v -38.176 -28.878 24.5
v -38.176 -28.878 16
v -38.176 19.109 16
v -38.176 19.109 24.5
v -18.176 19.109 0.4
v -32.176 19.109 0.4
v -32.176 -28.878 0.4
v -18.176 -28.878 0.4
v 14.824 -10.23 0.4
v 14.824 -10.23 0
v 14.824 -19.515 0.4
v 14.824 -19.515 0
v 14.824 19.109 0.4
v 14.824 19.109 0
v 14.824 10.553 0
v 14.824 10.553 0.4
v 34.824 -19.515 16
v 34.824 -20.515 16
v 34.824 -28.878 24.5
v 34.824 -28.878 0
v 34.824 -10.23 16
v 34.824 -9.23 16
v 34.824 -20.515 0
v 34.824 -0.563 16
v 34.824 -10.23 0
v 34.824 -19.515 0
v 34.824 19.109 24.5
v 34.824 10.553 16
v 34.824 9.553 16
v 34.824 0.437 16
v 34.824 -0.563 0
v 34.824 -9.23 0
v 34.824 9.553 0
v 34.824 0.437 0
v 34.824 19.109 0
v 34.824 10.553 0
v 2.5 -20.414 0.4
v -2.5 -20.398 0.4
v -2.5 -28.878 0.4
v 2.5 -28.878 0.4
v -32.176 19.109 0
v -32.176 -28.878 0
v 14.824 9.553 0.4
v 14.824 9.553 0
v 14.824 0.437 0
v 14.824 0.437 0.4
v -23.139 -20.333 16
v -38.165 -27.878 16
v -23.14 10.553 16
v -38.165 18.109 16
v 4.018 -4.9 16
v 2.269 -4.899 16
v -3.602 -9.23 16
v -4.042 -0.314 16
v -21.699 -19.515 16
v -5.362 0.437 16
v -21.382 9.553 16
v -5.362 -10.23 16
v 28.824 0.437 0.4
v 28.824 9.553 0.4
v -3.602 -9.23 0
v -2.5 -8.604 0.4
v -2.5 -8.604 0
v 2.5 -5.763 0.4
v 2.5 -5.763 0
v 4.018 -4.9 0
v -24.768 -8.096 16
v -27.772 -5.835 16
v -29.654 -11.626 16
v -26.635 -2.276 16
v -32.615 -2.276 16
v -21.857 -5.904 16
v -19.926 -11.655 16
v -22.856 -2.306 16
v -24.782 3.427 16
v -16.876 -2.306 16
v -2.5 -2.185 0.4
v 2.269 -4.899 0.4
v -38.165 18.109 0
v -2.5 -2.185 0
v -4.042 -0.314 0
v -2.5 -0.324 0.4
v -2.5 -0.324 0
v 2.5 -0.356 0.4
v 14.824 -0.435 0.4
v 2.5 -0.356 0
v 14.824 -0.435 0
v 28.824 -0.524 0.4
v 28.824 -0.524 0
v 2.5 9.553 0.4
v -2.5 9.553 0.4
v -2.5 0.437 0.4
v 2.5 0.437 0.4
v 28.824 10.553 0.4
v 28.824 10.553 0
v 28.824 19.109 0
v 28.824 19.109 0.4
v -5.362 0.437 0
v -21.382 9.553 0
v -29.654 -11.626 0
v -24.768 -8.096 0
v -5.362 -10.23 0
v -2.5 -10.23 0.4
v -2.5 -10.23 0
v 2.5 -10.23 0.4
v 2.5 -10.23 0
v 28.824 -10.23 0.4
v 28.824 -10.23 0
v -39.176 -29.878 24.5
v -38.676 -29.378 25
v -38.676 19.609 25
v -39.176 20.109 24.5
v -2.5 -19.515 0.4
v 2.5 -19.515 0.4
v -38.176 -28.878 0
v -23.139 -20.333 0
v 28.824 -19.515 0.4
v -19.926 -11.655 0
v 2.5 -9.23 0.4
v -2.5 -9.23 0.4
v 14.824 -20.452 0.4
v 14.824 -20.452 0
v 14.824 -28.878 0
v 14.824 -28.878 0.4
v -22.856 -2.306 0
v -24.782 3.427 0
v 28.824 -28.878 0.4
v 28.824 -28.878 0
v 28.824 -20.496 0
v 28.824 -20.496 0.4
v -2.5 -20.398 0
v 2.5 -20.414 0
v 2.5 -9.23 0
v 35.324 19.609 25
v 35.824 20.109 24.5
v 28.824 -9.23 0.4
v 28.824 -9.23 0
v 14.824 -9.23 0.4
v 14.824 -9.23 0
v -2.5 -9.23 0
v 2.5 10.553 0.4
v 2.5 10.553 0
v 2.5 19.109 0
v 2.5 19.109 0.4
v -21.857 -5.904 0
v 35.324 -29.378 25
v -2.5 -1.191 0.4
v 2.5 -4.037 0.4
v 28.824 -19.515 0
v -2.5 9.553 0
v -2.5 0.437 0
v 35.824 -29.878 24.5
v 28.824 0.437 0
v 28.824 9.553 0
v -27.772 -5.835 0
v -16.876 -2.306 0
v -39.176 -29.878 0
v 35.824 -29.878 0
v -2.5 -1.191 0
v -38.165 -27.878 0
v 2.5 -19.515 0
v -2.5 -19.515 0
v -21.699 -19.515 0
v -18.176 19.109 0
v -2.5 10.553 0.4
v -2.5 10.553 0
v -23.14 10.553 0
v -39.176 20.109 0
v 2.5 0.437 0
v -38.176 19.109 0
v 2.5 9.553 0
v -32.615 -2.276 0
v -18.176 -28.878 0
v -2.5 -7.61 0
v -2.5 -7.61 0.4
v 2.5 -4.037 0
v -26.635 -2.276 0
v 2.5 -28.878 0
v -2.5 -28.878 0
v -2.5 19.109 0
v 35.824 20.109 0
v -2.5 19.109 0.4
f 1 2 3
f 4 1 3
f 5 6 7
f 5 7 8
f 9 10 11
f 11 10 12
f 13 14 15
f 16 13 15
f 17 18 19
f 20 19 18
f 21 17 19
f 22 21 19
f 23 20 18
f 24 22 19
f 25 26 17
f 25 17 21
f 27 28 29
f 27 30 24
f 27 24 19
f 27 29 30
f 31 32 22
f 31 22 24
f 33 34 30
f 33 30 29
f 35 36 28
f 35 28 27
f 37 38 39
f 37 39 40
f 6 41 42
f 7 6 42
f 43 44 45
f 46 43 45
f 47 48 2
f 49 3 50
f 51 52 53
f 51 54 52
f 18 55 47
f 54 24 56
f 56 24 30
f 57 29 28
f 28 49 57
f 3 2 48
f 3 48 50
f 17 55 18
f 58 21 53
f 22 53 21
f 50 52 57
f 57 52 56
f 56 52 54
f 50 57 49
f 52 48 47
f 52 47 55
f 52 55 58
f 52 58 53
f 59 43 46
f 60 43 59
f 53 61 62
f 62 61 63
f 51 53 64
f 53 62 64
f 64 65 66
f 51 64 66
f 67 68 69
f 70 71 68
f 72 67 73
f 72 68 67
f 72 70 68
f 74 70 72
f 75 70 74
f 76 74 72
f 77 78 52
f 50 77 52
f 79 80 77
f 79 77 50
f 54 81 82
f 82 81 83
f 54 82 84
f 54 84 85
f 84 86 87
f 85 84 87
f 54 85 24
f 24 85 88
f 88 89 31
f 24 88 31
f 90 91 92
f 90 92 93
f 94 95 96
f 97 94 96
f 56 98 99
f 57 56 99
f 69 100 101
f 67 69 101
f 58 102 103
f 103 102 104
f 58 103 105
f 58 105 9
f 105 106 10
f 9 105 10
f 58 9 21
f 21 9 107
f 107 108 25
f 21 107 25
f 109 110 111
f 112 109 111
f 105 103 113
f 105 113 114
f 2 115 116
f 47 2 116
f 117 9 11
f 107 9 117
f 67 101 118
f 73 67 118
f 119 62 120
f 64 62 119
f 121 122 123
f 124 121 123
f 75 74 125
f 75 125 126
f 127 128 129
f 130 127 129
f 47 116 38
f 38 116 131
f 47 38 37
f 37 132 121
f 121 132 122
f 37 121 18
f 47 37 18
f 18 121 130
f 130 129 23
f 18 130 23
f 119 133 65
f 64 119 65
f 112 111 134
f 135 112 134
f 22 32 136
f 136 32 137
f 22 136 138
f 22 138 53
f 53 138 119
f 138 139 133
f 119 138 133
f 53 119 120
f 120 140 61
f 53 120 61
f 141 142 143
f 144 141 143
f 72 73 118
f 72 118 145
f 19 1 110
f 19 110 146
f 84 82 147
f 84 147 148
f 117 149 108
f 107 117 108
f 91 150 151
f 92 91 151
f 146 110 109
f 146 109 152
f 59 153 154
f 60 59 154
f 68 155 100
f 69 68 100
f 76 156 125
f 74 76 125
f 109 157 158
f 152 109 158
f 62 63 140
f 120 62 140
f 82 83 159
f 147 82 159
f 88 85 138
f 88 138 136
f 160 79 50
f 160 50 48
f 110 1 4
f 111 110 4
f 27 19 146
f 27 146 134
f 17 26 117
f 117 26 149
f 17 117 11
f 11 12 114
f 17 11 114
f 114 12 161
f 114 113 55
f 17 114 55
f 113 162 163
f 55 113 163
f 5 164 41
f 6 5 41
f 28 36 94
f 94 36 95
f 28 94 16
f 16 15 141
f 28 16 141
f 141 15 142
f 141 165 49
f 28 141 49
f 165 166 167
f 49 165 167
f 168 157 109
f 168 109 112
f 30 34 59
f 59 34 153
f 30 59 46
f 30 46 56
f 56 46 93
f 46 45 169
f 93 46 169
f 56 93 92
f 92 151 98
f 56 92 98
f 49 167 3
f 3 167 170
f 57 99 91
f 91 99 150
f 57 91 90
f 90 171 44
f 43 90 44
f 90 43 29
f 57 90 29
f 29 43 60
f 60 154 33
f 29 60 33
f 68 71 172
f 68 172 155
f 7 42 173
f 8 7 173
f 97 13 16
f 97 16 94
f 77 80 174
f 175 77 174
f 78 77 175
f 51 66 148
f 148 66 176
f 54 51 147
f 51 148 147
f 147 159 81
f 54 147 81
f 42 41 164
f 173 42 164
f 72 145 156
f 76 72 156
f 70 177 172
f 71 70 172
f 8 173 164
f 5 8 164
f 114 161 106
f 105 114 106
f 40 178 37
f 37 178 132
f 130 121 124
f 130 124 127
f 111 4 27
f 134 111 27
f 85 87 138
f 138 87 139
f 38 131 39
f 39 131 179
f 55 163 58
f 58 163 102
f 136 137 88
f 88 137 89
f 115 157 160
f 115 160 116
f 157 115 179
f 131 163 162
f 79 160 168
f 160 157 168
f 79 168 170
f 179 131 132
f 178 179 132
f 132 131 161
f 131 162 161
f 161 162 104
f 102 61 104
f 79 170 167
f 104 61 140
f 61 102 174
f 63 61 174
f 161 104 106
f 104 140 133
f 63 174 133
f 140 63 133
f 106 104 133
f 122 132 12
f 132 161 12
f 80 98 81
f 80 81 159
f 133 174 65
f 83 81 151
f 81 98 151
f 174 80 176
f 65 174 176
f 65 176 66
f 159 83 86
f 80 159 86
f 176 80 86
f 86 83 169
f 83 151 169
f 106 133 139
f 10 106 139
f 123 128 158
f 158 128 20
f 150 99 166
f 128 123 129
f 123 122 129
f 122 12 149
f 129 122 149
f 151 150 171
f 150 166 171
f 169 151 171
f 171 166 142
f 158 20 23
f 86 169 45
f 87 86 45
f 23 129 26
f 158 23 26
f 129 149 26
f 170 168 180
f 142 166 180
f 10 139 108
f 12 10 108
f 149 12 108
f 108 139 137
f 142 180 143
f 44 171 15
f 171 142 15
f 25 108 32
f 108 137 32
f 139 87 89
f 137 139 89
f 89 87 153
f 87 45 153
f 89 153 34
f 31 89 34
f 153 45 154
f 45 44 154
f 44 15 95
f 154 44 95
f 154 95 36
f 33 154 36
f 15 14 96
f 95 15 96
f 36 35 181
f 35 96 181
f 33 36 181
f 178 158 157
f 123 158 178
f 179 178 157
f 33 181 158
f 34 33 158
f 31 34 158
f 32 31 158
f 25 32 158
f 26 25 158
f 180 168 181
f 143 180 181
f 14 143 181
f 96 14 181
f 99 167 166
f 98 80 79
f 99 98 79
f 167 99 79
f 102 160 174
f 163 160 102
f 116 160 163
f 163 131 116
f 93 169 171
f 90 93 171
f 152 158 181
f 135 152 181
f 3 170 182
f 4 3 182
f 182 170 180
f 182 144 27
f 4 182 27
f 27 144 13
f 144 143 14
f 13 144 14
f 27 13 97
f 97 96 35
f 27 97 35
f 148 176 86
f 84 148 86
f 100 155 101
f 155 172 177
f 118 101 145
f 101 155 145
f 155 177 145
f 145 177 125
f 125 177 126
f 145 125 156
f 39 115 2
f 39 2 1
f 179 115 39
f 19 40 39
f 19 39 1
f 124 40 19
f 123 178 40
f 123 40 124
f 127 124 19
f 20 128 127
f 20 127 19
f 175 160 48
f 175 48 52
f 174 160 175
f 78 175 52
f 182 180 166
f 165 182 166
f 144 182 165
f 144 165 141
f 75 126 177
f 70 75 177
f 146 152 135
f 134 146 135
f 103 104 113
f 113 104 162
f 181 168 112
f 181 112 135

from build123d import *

# Parameters (mm, degrees)
F1_W      = 75
F1_H      = 49.9875
F2_DEPTH  = 25
F3_W      = 73
F3_H      = 47.9875
F4_DEPTH  = 25
F5_SIZE2  = 0.49999
F5_SIZE   = 0.49999
F7_DEPTH  = 16
F9_DEPTH  = 16
F11_DEPTH = 16
F13_DEPTH = 16
F15_DEPTH = 16
F17_DEPTH = 16
F19_DEPTH = 16
F21_DEPTH = 0.4
F23_DEPTH = 0.4
F25_DEPTH = 0.4


# Not quite as in the source:
# - a fillet or chamfer is up to 0.001 mm smaller than in the source, because OpenCascade refuses the exact size


with BuildPart() as f2:
    # F1 (on Top) → F2 (new body)
    with BuildSketch(Plane.XY):
        with Locations((-1.6757239815, -4.8845620042)):
            Rectangle(F1_W, F1_H)
    extrude(amount=F2_DEPTH)

    # F3 (on Top) → F4 (cut)
    with BuildSketch(Plane.XY):
        with Locations((-1.6757239815, -4.8845620042)):
            Rectangle(F3_W, F3_H)
    extrude(amount=F4_DEPTH, mode=Mode.SUBTRACT)

    # F5 (size 0.5 and 0.5 in the source; OpenCascade refuses exactly that, so slightly less here)
    f5_edges = [f2.edges().sort_by_distance(p)[0] for p in [
        (-1.675724, -29.878312, 25),
        (-39.175724, -4.884562, 25),
        (35.824276, -4.884562, 25),
        (-1.675724, 20.109188, 25),
        (-1.675724, -28.878312, 25),
        (34.824276, -4.884562, 25),
        (-1.675724, 19.109188, 25),
        (-38.175724, -4.884562, 25),
    ]]
    chamfer(f5_edges, length=F5_SIZE, length2=F5_SIZE2)

    # F6 (on Top) → F7 (join)
    with BuildSketch(Plane.XY):
        Polygon((4.0175896138, -4.9000722356), (-38.1757239815, 19.1091879958), (-38.1757239815, -28.8783120042), align=None)
    extrude(amount=F7_DEPTH)

    # F8 (on Top) → F9 (cut)
    with BuildSketch(Plane.XY):
        Polygon((2.2694178753, -4.8994258076), (-38.1653830409, 18.1091879958), (-38.1653830409, -27.8783120042), align=None)
    extrude(amount=F9_DEPTH, mode=Mode.SUBTRACT)

    # F10 (on Top) → F11 (join)
    with BuildSketch(Plane.XY):
        Polygon((34.8242760185, 10.5531314617), (-23.1395099124, 10.5531314617), (-21.3821332507, 9.5531314617), (34.8242760185, 9.5531314617), align=None)
    extrude(amount=F11_DEPTH)

    # F12 (on Top) → F13 (join)
    with BuildSketch(Plane.XY):
        Polygon((34.8242760185, 0.4371882224), (-5.3619873524, 0.4371882224), (-4.0423821136, -0.3137067153), (34.8242760185, -0.5628117776), align=None)
    extrude(amount=F13_DEPTH)

    # F14 (on Top) → F15 (join)
    with BuildSketch(Plane.XY):
        Polygon((34.8242760185, -9.2302871699), (-3.6020738153, -9.2302871699), (-5.3617239815, -10.2302871699), (34.8242760185, -10.2302871699), align=None)
    extrude(amount=F15_DEPTH)

    # F16 (on Top) → F17 (join)
    with BuildSketch(Plane.XY):
        Polygon((-21.6990868828, -19.5147251875), (-23.1394399608, -20.3332703197), (34.8242760185, -20.5147251875), (34.8242760185, -19.5147251875), align=None)
    extrude(amount=F17_DEPTH)

    # F22 (on Top) → F23 (join)
    with BuildSketch(Plane.XY):
        Polygon((28.8242760185, 19.1091879958), (14.8242760185, 19.1091879958), (14.8242760185, -29.8783120042), (28.8242760185, -29.8783120042), (28.8242760185, 4.2719491757), align=None)
    extrude(amount=F23_DEPTH)

    # F24 (on Top) → F25 (join)
    with BuildSketch(Plane.XY):
        Polygon((2.5, 19.1091879958), (-2.5, 19.1091879958), (-2.5, -28.8783120042), (2.5, -28.8783120042), (2.5, 7.0442273282), align=None)
    extrude(amount=F25_DEPTH)


with BuildPart() as f19:
    # F18 (on Top) → F19 (new body)
    with BuildSketch(Plane.XY):
        Polygon((-22.8562415051, -2.3057359916), (-24.7815981912, 3.4265754099), (-26.6346354038, -2.2761789151), (-32.6149091125, -2.2761789151), (-27.7723465115, -5.8351713233), (-29.6539459378, -11.6258263588), (-24.7676242143, -8.0960066989), (-19.9255160506, -11.6546651231), (-21.8570372557, -5.9040002689), (-16.8759677964, -2.3057359916), align=None)
    extrude(amount=F19_DEPTH)


with BuildPart() as f21:
    # F20 (on Top) → F21 (new body)
    with BuildSketch(Plane.XY):
        Polygon((-18.1757239815, 19.1091879958), (-32.1757239815, 19.1091879958), (-32.1757239815, 8.0351457), (-32.1757239815, -28.8783120042), (-18.1757239815, -28.8783120042), align=None)
    extrude(amount=F21_DEPTH)


solid = Compound([f2.part, f19.part, f21.part])
